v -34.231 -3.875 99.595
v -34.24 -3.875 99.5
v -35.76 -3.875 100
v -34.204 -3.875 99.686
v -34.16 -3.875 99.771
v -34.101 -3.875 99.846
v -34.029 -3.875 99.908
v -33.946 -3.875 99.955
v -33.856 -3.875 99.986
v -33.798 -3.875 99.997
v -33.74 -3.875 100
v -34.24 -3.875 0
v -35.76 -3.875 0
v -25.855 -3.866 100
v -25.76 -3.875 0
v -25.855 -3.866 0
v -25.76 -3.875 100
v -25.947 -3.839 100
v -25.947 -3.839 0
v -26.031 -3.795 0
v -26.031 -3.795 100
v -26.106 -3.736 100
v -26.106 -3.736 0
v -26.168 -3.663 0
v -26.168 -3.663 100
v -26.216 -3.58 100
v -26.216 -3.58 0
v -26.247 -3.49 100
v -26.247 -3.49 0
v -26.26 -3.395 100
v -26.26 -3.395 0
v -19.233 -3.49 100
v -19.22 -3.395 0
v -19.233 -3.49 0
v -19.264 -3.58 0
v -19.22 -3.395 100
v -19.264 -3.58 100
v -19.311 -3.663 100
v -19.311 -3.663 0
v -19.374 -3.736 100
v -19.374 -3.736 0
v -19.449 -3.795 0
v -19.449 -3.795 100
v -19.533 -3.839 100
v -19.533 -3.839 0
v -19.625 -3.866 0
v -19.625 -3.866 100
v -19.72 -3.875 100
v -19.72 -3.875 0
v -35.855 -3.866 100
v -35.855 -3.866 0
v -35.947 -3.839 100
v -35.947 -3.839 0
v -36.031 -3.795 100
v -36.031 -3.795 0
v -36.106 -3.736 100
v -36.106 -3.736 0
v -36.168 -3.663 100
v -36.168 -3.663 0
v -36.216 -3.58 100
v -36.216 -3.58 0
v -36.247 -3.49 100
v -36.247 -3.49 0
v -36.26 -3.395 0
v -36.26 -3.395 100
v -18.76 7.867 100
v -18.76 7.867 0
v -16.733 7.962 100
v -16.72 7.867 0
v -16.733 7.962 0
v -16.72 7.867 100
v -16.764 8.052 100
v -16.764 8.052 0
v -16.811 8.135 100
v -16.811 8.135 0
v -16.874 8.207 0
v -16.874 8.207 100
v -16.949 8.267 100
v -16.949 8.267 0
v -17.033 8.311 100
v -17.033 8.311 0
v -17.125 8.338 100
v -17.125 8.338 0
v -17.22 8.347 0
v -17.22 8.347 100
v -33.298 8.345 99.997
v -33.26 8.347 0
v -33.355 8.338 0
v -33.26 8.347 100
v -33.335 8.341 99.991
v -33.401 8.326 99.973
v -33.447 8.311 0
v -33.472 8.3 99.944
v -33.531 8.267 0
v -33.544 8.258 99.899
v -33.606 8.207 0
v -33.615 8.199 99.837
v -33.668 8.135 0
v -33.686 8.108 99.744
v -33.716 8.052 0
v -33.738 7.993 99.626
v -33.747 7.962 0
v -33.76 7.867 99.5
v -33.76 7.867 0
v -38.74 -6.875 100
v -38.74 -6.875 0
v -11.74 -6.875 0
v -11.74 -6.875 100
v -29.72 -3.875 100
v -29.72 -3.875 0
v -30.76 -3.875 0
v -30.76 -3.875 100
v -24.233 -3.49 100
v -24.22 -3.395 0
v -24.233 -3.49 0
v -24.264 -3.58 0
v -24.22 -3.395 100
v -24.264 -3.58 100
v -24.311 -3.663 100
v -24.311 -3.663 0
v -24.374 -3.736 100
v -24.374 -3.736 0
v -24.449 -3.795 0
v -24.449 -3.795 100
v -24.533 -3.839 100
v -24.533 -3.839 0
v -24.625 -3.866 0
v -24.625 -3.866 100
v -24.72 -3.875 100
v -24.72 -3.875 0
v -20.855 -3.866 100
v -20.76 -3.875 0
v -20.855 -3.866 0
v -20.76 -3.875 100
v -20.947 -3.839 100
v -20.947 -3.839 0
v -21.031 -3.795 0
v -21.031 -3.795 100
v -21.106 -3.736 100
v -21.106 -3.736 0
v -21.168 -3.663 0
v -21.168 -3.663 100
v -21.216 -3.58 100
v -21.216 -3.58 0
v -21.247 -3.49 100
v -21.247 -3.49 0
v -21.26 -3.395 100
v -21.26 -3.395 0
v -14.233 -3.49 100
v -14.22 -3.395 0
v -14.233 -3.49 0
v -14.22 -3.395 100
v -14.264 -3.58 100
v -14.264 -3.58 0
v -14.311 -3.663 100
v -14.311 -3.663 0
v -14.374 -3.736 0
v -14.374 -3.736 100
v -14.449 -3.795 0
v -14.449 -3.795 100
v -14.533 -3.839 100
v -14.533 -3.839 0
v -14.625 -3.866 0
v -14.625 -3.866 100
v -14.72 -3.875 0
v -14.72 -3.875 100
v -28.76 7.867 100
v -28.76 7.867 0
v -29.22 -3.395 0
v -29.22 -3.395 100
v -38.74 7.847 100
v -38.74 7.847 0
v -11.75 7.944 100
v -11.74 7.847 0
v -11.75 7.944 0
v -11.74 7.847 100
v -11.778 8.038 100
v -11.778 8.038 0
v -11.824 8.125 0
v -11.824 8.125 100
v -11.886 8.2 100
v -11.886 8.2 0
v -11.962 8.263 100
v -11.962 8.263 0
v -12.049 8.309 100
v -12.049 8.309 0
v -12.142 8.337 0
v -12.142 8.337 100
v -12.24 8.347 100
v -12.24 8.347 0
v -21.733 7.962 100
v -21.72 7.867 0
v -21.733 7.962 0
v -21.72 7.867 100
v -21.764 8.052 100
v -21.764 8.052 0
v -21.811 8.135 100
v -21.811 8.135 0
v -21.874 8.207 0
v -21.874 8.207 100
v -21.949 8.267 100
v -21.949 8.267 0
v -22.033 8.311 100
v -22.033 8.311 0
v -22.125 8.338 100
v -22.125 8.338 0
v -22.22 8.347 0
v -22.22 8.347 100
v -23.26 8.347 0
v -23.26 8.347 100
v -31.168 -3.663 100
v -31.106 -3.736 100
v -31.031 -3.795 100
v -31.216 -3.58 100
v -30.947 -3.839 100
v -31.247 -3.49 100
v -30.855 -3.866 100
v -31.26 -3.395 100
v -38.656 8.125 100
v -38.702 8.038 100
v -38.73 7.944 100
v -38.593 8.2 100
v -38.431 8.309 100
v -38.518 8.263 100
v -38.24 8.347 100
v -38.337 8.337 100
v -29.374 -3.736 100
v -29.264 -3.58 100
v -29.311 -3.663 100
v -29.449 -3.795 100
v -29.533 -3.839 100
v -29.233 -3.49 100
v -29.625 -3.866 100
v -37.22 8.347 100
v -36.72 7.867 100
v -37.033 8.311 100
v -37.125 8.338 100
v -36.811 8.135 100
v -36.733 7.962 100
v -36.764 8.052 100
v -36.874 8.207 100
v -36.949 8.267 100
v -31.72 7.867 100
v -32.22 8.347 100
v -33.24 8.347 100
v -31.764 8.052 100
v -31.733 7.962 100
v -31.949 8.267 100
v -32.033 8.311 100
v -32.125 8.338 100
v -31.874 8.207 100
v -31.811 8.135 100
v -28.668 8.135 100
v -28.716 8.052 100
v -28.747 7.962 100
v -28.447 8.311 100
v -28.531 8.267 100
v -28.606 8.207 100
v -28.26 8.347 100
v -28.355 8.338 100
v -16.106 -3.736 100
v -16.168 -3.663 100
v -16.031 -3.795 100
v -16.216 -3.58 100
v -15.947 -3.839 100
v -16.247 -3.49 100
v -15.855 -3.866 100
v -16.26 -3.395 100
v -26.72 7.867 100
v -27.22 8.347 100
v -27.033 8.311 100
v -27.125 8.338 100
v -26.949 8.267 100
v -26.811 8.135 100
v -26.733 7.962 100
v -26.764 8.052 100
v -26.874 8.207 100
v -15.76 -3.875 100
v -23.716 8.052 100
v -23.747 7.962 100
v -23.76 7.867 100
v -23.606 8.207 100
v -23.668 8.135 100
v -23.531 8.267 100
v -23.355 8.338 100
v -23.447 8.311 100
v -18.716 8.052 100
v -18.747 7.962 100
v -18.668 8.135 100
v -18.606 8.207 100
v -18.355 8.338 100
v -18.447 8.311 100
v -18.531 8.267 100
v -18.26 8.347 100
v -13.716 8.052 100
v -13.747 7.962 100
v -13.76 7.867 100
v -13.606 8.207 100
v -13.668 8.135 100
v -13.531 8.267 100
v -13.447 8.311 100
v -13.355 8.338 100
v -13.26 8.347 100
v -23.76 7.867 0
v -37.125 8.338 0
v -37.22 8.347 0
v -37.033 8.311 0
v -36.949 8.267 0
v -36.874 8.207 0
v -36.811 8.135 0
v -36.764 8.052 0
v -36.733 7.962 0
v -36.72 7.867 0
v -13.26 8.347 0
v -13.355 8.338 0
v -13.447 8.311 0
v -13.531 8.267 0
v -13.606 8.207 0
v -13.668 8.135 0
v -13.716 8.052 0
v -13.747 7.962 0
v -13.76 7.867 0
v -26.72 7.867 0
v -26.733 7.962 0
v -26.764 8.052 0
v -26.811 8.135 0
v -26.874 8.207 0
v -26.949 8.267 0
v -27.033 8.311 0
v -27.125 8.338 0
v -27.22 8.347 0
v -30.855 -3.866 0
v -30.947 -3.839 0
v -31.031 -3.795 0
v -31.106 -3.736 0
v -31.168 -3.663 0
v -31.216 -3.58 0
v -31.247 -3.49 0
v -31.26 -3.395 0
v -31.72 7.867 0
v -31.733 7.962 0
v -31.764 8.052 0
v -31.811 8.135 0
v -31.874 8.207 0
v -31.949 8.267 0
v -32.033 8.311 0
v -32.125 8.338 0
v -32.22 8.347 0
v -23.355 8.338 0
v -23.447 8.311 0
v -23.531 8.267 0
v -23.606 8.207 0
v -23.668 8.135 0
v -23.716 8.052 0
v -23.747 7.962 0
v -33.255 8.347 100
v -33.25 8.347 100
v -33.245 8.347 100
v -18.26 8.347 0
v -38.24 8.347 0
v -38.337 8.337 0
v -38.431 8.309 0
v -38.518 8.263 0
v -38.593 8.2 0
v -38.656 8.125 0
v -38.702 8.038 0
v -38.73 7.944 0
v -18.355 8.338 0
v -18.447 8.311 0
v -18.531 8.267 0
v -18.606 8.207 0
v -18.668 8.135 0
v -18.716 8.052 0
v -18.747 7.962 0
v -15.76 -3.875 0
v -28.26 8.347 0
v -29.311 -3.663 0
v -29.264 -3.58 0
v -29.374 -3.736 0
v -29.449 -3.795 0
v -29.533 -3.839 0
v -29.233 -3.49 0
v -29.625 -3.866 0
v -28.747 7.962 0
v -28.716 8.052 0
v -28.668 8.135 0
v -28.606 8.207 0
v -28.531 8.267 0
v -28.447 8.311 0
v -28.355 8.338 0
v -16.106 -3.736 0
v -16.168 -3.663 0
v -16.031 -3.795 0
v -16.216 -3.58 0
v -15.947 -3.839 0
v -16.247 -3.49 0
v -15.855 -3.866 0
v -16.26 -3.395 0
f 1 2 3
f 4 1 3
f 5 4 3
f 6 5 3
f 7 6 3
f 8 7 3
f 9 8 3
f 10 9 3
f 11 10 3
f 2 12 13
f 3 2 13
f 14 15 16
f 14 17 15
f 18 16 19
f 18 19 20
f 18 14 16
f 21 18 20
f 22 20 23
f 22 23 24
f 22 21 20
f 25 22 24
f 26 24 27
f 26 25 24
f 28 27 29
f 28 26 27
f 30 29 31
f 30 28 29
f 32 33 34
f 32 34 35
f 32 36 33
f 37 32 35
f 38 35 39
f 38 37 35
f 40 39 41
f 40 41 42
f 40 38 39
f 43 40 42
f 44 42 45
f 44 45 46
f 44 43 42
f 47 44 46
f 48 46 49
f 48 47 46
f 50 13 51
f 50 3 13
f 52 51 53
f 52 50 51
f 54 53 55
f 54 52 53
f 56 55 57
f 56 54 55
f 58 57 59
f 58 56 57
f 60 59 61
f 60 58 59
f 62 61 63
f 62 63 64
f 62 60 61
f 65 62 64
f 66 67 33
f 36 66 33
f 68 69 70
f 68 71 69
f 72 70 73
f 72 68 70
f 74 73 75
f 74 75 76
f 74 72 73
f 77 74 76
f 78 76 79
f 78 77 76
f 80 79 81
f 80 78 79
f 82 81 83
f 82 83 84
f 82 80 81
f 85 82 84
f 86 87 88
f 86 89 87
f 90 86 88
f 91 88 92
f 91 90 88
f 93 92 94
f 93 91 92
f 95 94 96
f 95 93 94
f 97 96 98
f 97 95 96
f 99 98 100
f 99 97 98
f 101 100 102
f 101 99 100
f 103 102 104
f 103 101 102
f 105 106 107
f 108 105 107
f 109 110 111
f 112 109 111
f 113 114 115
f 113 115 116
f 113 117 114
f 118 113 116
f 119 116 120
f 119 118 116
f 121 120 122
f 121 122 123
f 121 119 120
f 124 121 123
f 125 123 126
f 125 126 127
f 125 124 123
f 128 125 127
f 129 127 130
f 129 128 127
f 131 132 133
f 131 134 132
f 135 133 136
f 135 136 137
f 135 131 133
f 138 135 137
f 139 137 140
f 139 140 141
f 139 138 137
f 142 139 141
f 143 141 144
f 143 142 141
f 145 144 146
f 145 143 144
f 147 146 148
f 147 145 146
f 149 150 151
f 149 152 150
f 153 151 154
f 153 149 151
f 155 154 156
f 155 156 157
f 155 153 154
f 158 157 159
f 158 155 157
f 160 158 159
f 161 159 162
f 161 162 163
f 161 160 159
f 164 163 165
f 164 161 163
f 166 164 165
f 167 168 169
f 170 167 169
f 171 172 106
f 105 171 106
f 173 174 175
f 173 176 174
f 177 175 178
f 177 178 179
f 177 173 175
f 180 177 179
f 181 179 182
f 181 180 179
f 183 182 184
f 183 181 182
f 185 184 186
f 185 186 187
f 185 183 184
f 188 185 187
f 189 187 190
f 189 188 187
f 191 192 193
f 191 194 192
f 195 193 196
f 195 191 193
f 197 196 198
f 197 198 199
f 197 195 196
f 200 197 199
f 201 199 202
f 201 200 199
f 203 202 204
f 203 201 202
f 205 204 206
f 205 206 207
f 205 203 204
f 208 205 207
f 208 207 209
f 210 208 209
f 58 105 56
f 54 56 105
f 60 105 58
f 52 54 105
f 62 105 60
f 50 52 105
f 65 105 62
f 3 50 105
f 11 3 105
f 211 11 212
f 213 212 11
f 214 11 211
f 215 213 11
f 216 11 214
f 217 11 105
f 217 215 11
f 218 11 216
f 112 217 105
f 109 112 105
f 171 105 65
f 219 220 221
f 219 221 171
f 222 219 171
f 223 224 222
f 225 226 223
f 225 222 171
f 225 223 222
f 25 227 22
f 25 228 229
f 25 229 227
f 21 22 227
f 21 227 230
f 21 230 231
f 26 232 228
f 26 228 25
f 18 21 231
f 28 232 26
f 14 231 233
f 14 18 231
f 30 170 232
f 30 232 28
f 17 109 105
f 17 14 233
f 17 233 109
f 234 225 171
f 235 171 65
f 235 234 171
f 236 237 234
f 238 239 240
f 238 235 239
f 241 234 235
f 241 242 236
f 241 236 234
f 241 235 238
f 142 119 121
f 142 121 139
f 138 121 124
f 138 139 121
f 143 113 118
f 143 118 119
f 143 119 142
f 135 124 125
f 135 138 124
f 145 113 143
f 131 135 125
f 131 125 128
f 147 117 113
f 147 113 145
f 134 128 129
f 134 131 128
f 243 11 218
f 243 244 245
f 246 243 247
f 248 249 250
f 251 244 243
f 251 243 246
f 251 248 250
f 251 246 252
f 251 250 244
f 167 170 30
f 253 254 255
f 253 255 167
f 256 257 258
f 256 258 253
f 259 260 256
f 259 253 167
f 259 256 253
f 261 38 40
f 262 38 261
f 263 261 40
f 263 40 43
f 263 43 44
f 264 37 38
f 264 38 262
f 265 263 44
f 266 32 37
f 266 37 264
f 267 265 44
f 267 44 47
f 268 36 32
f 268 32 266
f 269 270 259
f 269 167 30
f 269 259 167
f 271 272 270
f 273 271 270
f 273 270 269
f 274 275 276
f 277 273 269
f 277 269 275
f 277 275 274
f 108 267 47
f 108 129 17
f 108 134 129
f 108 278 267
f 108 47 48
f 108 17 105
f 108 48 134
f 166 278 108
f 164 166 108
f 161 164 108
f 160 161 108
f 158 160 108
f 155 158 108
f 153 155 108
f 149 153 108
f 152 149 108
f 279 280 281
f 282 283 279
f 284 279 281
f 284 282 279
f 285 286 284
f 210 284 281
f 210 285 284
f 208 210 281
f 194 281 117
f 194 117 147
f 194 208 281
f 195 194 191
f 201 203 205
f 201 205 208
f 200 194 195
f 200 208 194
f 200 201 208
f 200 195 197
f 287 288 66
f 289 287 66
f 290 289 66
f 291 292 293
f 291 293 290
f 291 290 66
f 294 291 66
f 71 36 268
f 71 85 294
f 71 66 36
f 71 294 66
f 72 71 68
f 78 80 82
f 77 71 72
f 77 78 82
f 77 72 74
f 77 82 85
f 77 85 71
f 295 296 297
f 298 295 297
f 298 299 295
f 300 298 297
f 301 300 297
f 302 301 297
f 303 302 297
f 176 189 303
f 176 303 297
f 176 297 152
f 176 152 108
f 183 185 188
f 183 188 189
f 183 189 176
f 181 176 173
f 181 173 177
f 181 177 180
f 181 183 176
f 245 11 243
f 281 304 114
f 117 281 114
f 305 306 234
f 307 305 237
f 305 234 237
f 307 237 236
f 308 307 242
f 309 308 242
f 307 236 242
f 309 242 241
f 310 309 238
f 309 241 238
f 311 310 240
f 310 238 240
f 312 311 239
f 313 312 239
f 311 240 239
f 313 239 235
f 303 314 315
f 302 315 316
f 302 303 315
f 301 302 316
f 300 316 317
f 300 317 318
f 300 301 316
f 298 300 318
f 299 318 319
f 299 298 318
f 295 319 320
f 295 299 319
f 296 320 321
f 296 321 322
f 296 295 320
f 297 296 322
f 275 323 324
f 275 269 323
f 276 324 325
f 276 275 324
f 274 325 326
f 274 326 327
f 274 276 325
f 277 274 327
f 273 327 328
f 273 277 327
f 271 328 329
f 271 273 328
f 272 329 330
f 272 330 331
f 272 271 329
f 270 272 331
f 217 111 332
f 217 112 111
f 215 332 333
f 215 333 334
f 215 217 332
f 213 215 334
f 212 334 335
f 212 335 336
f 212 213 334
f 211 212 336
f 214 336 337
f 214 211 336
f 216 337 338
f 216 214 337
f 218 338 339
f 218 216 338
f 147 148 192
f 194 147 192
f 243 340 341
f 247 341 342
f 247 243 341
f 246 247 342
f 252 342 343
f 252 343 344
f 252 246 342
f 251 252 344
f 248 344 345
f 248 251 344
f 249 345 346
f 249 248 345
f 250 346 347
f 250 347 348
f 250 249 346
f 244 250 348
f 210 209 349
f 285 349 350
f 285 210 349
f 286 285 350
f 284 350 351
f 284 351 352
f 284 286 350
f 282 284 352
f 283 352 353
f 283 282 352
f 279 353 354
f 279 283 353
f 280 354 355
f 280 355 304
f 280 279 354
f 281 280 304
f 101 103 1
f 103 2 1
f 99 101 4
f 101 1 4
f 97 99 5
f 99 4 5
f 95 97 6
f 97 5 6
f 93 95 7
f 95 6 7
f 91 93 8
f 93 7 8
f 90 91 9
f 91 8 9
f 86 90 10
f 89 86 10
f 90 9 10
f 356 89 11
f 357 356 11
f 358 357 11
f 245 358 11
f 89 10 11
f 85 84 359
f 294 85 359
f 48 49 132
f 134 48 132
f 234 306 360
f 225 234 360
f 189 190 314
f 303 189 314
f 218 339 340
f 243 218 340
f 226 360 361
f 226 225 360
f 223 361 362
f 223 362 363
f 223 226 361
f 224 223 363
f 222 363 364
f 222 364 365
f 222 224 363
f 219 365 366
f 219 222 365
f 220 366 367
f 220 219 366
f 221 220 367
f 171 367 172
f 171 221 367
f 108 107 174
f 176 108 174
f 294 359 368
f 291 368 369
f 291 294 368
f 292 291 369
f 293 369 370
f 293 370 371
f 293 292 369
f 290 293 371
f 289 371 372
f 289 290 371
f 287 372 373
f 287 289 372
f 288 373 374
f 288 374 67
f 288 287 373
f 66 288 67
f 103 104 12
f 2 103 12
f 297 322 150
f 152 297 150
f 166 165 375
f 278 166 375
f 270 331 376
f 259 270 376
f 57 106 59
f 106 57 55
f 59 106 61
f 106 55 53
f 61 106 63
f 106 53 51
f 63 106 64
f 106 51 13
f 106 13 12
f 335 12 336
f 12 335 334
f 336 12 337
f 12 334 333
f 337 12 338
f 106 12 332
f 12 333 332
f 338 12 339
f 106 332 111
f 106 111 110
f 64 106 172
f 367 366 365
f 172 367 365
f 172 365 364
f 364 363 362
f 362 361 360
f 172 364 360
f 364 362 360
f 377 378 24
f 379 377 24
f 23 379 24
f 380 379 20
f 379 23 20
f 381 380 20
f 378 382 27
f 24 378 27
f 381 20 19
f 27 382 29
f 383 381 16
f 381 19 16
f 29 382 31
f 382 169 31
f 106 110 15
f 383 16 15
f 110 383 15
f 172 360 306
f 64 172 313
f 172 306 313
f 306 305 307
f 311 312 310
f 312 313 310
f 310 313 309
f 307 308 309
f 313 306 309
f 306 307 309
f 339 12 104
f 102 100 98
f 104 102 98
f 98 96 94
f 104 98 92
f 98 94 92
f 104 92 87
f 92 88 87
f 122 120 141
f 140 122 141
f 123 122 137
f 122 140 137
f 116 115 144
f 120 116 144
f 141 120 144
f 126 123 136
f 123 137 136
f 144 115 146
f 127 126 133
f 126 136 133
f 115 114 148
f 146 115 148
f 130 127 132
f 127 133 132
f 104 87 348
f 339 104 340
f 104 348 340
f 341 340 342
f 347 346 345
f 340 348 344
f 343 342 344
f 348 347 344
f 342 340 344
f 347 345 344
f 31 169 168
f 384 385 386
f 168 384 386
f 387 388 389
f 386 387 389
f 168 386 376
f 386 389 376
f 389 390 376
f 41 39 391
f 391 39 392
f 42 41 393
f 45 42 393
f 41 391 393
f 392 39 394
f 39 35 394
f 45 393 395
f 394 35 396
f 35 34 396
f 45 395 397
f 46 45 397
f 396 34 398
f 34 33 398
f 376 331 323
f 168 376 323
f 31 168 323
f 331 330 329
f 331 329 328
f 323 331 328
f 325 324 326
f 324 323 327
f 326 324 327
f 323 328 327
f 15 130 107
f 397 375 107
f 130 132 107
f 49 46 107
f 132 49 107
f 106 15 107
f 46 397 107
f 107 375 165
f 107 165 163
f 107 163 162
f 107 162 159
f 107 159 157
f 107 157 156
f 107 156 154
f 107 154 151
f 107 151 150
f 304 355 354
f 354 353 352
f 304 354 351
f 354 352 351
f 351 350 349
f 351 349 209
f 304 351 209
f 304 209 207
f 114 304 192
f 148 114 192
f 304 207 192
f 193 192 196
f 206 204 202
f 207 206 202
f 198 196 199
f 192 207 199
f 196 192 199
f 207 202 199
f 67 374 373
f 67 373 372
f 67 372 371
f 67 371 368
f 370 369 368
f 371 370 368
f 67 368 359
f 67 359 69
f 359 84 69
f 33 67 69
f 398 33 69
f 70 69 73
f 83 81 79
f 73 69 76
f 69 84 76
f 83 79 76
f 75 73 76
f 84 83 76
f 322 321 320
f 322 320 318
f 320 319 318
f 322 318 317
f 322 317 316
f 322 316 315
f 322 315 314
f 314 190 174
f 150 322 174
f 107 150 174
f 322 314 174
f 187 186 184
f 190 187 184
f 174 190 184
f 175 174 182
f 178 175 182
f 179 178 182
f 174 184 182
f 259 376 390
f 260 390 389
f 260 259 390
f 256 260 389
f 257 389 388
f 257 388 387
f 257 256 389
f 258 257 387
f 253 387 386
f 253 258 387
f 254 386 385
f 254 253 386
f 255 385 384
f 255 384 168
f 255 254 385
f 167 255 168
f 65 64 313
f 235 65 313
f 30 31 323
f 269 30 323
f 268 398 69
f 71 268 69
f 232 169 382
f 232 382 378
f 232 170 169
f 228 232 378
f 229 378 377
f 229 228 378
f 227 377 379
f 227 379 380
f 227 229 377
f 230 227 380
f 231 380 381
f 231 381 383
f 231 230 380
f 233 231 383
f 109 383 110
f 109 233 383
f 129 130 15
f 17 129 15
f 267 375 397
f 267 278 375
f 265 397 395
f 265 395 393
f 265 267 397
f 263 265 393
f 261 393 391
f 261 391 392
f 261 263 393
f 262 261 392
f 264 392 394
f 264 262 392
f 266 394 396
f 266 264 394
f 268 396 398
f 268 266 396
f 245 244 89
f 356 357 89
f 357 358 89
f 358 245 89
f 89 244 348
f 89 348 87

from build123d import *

# Parameters (mm, degrees)
F1_DEPTH = 100
F2_R     = 0.5


with BuildPart() as f1:
    # F0 (on Top) → F1 (new body)
    with BuildSketch(Plane.XY):
        Polygon((-36.73992, 8.346775), (-38.73992, 8.346775), (-38.73992, -6.87493), (-11.73992, -6.87493), (-11.73992, 8.346775), (-13.73992, 8.346775), (-14.23992, -3.87493), (-16.23992, -3.87493), (-16.73992, 8.346775), (-18.73992, 8.346775), (-19.23992, -3.87493), (-21.23992, -3.87493), (-21.73992, 8.346775), (-23.73992, 8.346775), (-24.23992, -3.87493), (-26.23992, -3.87493), (-26.73992, 8.346775), (-28.73992, 8.346775), (-29.23992, -3.87493), (-31.23992, -3.87493), (-31.73992, 8.346775), (-33.73992, 8.346775), (-34.23992, -3.87493), (-36.23992, -3.87493), align=None)
    extrude(amount=F1_DEPTH)

    # F2
    f2_edges = [f1.edges().sort_by_distance(p)[0] for p in [
        (-13.73992, 8.346775, 50),
        (-11.73992, 8.346775, 50),
        (-18.73992, 8.346775, 50),
        (-16.73992, 8.346775, 50),
        (-23.73992, 8.346775, 50),
        (-21.73992, 8.346775, 50),
        (-28.73992, 8.346775, 50),
        (-26.73992, 8.346775, 50),
        (-33.73992, 8.346775, 50),
        (-31.73992, 8.346775, 50),
        (-38.73992, 8.346775, 50),
        (-36.73992, 8.346775, 50),
        (-36.23992, -3.87493, 50),
        (-33.98992, 2.235922, 100),
        (-31.23992, -3.87493, 50),
        (-26.23992, -3.87493, 50),
        (-24.23992, -3.87493, 50),
        (-29.23992, -3.87493, 50),
        (-21.23992, -3.87493, 50),
        (-19.23992, -3.87493, 50),
        (-16.23992, -3.87493, 50),
        (-14.23992, -3.87493, 50),
    ]]
    fillet(f2_edges, radius=F2_R)


solid = f1.part
